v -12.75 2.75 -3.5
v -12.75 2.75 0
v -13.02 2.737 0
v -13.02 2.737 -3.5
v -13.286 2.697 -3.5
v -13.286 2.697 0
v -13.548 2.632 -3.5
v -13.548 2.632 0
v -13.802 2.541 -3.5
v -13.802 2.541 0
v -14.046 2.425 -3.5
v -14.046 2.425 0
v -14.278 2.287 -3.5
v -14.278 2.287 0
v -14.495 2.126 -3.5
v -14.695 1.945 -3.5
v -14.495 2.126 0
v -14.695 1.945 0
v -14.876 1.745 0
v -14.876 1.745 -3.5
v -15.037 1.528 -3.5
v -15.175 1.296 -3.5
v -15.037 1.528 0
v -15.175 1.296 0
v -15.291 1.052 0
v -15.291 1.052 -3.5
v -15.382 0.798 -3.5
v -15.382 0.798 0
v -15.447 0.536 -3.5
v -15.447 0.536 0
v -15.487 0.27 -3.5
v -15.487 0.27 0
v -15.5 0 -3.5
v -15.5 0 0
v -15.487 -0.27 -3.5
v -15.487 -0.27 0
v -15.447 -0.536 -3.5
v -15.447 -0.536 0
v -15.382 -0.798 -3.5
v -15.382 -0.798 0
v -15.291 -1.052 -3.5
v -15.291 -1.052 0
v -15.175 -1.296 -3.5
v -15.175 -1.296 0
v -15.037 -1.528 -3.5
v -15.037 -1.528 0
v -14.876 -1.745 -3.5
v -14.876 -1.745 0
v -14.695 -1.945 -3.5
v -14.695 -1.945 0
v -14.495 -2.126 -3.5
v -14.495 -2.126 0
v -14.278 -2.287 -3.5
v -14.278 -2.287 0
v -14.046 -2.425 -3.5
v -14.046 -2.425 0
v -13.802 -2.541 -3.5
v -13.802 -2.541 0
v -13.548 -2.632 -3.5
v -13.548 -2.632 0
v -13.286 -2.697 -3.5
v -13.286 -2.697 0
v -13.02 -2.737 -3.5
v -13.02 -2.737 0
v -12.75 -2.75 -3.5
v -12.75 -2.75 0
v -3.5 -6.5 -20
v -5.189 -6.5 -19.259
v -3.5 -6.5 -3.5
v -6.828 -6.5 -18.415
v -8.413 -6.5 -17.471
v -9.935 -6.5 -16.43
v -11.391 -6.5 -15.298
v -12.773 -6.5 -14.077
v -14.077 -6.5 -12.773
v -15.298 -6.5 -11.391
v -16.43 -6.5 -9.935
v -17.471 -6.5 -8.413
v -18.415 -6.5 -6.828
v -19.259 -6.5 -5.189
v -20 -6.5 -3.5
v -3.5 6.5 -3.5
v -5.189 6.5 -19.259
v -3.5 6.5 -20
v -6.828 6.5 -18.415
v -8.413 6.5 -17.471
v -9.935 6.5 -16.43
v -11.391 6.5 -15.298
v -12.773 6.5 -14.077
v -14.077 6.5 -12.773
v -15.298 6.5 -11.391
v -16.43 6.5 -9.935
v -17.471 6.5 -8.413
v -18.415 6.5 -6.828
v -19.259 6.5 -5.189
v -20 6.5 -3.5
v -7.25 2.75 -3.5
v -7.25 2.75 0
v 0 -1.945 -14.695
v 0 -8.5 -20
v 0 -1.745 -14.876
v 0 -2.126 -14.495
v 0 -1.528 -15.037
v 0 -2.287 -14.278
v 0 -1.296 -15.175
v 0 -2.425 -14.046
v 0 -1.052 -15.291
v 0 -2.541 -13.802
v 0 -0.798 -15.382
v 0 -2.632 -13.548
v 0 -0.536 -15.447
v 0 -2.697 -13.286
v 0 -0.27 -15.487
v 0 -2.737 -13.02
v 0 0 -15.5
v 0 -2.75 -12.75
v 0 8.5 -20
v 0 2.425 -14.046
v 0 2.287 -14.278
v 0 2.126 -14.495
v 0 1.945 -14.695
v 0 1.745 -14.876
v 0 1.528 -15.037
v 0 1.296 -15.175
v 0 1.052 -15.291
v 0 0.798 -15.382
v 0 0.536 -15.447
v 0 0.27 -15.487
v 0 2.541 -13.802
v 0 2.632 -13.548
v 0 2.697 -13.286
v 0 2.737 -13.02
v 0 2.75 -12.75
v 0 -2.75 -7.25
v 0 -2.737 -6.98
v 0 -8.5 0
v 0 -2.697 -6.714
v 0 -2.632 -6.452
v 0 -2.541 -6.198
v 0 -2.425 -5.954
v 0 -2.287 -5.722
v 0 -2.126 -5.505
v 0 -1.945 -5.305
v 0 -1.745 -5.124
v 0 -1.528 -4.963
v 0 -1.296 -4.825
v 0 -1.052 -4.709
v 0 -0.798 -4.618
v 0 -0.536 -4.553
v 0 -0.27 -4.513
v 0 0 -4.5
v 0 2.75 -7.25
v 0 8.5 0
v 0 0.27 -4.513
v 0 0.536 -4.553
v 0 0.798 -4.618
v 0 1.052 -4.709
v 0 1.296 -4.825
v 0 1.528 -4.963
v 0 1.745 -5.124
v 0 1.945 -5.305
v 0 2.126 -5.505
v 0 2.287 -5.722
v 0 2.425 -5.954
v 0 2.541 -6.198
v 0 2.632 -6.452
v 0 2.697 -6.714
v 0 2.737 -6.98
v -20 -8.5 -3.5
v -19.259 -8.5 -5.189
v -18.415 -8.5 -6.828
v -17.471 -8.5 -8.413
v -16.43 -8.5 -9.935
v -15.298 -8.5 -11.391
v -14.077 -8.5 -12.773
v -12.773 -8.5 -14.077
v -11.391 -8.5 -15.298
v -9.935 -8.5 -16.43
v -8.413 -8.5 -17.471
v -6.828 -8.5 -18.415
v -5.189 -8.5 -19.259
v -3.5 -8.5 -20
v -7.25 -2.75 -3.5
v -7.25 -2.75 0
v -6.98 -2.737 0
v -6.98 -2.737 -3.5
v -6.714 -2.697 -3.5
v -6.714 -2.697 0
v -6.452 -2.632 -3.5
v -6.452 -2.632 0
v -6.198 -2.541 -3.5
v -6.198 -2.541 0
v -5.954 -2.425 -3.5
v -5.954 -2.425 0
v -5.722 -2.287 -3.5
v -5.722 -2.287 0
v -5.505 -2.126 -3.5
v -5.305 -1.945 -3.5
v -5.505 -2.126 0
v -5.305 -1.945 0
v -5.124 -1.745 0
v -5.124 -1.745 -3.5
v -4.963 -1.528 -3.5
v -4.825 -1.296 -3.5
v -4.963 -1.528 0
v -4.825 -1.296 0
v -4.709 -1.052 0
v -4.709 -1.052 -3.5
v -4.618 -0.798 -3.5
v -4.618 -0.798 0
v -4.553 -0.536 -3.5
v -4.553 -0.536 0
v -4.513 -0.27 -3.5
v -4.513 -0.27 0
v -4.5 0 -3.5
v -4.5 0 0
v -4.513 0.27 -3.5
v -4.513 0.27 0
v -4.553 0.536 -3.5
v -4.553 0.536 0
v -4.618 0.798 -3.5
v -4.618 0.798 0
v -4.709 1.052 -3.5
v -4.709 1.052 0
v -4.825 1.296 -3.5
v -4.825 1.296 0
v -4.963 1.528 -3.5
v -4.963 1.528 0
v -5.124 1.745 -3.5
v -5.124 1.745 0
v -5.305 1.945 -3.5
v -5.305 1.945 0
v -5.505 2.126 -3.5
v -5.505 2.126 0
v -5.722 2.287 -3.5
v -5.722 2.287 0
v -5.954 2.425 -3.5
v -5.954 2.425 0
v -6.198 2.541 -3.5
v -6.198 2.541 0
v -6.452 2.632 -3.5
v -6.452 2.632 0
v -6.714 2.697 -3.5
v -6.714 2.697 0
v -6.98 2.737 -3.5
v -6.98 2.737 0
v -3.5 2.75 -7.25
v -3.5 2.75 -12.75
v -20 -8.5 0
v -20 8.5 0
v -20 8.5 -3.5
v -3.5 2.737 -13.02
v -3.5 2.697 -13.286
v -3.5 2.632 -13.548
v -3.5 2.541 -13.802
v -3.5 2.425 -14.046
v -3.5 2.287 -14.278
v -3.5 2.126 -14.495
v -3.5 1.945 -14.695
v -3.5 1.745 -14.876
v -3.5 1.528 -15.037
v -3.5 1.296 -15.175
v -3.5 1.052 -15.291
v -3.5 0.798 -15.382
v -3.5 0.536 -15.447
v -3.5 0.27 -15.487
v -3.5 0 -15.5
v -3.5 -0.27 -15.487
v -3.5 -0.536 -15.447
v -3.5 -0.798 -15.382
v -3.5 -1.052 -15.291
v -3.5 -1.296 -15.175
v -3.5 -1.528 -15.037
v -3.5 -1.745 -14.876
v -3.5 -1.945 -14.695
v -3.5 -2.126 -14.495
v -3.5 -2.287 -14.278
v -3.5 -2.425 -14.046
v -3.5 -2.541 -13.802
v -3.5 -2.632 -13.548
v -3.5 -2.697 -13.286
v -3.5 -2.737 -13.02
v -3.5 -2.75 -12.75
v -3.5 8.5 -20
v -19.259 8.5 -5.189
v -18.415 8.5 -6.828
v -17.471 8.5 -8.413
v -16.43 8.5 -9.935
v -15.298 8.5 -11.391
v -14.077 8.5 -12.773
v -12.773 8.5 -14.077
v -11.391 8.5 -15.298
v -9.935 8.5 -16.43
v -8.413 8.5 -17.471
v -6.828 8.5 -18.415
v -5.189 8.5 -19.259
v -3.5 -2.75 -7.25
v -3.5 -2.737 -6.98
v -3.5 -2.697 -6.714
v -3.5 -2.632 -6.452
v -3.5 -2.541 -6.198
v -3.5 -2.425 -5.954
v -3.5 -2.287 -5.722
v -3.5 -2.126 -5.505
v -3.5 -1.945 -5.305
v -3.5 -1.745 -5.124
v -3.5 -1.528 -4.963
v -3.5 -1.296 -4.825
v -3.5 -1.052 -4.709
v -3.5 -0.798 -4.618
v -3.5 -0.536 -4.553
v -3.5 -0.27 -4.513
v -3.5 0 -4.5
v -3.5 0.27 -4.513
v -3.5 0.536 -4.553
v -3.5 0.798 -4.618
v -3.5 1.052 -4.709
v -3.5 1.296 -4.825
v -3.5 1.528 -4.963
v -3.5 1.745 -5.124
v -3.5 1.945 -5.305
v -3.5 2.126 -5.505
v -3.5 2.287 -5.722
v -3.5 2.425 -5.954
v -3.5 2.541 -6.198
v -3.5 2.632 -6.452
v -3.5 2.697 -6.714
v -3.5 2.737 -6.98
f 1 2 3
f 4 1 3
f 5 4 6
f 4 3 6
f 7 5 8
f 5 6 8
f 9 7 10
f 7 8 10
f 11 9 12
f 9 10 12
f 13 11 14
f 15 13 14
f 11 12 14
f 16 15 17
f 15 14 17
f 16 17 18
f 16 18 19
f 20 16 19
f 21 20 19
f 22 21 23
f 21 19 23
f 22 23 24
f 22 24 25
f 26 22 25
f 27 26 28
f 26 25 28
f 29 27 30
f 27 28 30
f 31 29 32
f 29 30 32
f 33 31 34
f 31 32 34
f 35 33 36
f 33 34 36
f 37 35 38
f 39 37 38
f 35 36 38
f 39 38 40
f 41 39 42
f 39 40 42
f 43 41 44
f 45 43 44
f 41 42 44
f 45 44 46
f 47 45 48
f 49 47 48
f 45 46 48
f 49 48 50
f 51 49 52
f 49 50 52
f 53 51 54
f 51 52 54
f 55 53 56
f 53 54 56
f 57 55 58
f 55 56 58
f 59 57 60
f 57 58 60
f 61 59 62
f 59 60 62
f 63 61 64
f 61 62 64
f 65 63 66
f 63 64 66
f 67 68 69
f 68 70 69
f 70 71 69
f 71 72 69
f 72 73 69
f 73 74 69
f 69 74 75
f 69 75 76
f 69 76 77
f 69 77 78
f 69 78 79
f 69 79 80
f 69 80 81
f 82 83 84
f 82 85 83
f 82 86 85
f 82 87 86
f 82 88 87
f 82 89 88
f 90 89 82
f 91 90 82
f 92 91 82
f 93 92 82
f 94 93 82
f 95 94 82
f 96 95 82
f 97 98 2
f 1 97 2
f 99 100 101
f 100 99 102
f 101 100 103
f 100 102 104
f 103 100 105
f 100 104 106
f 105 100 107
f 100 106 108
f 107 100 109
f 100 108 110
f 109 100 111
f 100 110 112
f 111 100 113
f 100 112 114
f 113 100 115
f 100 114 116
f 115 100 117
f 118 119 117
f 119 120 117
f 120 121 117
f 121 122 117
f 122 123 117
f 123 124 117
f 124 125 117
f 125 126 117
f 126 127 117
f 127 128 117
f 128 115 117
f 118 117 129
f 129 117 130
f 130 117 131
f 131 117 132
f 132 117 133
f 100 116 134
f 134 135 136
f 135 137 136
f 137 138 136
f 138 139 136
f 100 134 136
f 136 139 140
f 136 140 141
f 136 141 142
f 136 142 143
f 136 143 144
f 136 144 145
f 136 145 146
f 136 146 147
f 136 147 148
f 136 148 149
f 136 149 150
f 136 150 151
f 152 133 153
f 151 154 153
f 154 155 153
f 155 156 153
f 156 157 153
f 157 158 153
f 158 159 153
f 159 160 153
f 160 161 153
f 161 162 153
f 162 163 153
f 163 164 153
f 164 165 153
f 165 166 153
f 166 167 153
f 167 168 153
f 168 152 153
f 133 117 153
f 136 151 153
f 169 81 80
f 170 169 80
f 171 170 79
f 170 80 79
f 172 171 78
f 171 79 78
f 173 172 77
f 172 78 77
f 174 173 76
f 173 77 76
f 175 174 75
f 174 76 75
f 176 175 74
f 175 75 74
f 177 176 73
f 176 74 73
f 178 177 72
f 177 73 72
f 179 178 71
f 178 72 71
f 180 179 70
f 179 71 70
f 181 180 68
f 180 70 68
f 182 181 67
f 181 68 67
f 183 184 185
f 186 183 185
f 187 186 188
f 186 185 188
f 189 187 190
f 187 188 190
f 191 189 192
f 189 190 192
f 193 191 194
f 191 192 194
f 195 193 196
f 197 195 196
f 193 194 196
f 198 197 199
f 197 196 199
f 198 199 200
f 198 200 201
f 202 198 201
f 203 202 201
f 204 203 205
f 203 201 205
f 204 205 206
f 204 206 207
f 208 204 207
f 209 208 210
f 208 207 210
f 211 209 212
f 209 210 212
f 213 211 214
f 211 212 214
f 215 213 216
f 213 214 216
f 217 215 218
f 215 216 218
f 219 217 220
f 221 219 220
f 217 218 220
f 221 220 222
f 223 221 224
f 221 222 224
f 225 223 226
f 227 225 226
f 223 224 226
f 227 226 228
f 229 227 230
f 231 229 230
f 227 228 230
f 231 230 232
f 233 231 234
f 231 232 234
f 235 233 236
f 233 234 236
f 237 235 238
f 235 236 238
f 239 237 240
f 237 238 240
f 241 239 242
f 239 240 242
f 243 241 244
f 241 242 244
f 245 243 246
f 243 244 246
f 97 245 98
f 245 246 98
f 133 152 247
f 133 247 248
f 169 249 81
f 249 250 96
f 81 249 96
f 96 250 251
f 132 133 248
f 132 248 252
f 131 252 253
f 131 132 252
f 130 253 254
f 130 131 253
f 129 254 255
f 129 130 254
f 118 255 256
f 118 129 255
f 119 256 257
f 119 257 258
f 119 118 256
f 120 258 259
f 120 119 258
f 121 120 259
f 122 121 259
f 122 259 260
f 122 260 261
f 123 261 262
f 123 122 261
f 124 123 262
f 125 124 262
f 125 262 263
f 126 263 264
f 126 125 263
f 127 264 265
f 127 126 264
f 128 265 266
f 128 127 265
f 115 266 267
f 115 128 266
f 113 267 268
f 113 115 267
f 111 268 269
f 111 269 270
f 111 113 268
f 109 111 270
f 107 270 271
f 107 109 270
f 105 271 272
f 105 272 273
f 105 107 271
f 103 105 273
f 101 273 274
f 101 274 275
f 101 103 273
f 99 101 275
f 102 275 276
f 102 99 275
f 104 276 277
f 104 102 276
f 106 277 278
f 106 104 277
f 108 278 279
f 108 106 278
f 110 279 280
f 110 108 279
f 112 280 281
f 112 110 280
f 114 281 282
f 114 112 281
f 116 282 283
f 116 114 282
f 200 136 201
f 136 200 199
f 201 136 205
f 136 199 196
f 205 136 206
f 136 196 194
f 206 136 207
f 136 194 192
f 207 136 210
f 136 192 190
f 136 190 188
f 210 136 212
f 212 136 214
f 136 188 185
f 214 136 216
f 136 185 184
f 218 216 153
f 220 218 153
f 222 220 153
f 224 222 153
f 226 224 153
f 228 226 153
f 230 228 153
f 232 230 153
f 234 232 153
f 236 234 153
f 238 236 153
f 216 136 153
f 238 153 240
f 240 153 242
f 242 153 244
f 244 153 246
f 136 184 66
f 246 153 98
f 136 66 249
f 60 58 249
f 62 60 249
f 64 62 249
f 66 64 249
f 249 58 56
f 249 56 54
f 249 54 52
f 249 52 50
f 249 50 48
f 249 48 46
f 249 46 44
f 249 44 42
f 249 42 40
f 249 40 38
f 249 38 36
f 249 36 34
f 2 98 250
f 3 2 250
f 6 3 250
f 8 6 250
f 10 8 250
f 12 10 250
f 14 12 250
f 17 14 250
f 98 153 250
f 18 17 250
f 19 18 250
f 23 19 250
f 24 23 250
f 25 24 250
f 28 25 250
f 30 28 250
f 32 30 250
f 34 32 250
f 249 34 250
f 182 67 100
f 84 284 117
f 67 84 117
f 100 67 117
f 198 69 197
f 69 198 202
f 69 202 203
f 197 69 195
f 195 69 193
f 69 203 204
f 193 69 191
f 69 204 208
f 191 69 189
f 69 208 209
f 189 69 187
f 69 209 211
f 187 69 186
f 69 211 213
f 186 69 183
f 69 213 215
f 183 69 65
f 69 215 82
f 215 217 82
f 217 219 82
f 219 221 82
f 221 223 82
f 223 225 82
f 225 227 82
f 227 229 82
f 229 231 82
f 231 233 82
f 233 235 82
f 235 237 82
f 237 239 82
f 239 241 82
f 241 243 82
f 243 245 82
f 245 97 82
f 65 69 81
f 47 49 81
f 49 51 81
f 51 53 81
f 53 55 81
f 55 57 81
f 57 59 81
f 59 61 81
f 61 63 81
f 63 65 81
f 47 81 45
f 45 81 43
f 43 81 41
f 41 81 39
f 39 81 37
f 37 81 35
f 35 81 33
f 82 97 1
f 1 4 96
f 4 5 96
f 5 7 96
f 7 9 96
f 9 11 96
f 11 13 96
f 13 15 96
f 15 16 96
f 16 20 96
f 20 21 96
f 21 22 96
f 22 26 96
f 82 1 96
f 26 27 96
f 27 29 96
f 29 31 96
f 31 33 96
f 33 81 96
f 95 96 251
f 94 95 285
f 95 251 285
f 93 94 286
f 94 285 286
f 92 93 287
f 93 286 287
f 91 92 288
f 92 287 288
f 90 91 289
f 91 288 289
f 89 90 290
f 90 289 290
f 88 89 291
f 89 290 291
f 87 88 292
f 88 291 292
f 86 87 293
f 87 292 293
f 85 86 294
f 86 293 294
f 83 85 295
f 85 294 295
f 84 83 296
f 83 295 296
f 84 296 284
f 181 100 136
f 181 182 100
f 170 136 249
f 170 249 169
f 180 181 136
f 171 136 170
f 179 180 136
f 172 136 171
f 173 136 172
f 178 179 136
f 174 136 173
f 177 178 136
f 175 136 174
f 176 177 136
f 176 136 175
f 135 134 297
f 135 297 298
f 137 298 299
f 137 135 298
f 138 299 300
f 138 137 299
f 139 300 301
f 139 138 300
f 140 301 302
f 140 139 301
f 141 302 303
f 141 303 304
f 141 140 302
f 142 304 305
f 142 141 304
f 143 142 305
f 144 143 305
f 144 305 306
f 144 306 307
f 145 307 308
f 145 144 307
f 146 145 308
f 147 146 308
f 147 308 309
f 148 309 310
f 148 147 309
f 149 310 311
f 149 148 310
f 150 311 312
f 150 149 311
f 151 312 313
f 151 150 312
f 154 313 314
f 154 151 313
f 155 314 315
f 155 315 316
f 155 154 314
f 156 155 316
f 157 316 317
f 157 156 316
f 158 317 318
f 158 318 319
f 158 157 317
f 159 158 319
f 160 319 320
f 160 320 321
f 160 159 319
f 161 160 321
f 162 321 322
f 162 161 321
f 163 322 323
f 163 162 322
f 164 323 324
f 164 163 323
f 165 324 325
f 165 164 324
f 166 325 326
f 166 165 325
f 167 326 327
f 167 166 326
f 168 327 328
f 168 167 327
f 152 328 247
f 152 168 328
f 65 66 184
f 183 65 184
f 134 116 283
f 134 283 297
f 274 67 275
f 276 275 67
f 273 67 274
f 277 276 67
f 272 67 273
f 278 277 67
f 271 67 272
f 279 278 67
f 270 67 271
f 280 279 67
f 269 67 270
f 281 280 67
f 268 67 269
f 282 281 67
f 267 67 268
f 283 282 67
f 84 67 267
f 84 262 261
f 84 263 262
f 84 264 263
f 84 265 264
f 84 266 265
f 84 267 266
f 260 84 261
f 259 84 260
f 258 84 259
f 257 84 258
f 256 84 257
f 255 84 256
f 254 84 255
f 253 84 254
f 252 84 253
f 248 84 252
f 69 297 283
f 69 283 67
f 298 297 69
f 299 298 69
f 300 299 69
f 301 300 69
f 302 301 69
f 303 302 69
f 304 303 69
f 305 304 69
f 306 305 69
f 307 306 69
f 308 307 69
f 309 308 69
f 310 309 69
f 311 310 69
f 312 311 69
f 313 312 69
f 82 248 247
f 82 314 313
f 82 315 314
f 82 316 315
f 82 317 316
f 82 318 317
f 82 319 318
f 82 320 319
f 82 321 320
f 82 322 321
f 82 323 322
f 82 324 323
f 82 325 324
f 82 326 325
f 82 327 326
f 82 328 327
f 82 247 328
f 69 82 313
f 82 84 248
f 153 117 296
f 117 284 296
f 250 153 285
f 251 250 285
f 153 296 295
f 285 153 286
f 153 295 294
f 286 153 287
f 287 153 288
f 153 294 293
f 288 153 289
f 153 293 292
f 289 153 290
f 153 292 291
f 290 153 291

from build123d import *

# Parameters (mm, degrees)
BOSS_EXTRUDE1_DEPTH = 8.5
SKETCH2_W           = 16.5
SKETCH2_H           = 13
CUT_EXTRUDE1_DEPTH  = 16.5
CUT_EXTRUDE2_DEPTH  = 3.5
CUT_EXTRUDE3_DEPTH  = 3.5


with BuildPart() as part:
    # Sketch1 → Boss-Extrude1 (new body, symmetric)
    with BuildSketch(Plane(origin=(0, 0, 0), x_dir=(1, 0, 0), z_dir=(0, 1, 0))):
        with BuildLine():
            Line((0, 20), (0, 0))
            Line((0, 0), (-20, 0))
            Line((-20, 0), (-20, 3.5))
            ThreePointArc((-20, 3.5), (-13.435028843, 13.435028843), (-3.5, 20))
            Line((-3.5, 20), (0, 20))
        make_face()
    extrude(amount=BOSS_EXTRUDE1_DEPTH, both=True)

    # Sketch2 → Cut-Extrude1 (cut)
    with BuildSketch(Plane.ZY.offset(20)):
        with Locations((-11.75, 0)):
            Rectangle(SKETCH2_W, SKETCH2_H)
    extrude(amount=-CUT_EXTRUDE1_DEPTH, mode=Mode.SUBTRACT)

    # Sketch4 → Cut-Extrude2 (cut)
    with BuildSketch(Plane.XY):
        with BuildLine():
            Line((-7.25, 2.75), (-12.75, 2.75))
            ThreePointArc((-12.75, 2.75), (-15.5, 0), (-12.75, -2.75))
            Line((-12.75, -2.75), (-7.25, -2.75))
            ThreePointArc((-7.25, -2.75), (-4.5, 0), (-7.25, 2.75))
        make_face()
    extrude(amount=-CUT_EXTRUDE2_DEPTH, mode=Mode.SUBTRACT)

    # Sketch5 → Cut-Extrude3 (cut)
    with BuildSketch(Plane(origin=(0, 0, 0), x_dir=(0, 0, -1), z_dir=(1, 0, 0))):
        with BuildLine():
            Line((7.25, 2.75), (12.75, 2.75))
            ThreePointArc((12.75, 2.75), (15.5, 0), (12.75, -2.75))
            Line((12.75, -2.75), (7.25, -2.75))
            ThreePointArc((7.25, -2.75), (4.5, 0), (7.25, 2.75))
        make_face()
    extrude(amount=-CUT_EXTRUDE3_DEPTH, mode=Mode.SUBTRACT)


solid = part.part
